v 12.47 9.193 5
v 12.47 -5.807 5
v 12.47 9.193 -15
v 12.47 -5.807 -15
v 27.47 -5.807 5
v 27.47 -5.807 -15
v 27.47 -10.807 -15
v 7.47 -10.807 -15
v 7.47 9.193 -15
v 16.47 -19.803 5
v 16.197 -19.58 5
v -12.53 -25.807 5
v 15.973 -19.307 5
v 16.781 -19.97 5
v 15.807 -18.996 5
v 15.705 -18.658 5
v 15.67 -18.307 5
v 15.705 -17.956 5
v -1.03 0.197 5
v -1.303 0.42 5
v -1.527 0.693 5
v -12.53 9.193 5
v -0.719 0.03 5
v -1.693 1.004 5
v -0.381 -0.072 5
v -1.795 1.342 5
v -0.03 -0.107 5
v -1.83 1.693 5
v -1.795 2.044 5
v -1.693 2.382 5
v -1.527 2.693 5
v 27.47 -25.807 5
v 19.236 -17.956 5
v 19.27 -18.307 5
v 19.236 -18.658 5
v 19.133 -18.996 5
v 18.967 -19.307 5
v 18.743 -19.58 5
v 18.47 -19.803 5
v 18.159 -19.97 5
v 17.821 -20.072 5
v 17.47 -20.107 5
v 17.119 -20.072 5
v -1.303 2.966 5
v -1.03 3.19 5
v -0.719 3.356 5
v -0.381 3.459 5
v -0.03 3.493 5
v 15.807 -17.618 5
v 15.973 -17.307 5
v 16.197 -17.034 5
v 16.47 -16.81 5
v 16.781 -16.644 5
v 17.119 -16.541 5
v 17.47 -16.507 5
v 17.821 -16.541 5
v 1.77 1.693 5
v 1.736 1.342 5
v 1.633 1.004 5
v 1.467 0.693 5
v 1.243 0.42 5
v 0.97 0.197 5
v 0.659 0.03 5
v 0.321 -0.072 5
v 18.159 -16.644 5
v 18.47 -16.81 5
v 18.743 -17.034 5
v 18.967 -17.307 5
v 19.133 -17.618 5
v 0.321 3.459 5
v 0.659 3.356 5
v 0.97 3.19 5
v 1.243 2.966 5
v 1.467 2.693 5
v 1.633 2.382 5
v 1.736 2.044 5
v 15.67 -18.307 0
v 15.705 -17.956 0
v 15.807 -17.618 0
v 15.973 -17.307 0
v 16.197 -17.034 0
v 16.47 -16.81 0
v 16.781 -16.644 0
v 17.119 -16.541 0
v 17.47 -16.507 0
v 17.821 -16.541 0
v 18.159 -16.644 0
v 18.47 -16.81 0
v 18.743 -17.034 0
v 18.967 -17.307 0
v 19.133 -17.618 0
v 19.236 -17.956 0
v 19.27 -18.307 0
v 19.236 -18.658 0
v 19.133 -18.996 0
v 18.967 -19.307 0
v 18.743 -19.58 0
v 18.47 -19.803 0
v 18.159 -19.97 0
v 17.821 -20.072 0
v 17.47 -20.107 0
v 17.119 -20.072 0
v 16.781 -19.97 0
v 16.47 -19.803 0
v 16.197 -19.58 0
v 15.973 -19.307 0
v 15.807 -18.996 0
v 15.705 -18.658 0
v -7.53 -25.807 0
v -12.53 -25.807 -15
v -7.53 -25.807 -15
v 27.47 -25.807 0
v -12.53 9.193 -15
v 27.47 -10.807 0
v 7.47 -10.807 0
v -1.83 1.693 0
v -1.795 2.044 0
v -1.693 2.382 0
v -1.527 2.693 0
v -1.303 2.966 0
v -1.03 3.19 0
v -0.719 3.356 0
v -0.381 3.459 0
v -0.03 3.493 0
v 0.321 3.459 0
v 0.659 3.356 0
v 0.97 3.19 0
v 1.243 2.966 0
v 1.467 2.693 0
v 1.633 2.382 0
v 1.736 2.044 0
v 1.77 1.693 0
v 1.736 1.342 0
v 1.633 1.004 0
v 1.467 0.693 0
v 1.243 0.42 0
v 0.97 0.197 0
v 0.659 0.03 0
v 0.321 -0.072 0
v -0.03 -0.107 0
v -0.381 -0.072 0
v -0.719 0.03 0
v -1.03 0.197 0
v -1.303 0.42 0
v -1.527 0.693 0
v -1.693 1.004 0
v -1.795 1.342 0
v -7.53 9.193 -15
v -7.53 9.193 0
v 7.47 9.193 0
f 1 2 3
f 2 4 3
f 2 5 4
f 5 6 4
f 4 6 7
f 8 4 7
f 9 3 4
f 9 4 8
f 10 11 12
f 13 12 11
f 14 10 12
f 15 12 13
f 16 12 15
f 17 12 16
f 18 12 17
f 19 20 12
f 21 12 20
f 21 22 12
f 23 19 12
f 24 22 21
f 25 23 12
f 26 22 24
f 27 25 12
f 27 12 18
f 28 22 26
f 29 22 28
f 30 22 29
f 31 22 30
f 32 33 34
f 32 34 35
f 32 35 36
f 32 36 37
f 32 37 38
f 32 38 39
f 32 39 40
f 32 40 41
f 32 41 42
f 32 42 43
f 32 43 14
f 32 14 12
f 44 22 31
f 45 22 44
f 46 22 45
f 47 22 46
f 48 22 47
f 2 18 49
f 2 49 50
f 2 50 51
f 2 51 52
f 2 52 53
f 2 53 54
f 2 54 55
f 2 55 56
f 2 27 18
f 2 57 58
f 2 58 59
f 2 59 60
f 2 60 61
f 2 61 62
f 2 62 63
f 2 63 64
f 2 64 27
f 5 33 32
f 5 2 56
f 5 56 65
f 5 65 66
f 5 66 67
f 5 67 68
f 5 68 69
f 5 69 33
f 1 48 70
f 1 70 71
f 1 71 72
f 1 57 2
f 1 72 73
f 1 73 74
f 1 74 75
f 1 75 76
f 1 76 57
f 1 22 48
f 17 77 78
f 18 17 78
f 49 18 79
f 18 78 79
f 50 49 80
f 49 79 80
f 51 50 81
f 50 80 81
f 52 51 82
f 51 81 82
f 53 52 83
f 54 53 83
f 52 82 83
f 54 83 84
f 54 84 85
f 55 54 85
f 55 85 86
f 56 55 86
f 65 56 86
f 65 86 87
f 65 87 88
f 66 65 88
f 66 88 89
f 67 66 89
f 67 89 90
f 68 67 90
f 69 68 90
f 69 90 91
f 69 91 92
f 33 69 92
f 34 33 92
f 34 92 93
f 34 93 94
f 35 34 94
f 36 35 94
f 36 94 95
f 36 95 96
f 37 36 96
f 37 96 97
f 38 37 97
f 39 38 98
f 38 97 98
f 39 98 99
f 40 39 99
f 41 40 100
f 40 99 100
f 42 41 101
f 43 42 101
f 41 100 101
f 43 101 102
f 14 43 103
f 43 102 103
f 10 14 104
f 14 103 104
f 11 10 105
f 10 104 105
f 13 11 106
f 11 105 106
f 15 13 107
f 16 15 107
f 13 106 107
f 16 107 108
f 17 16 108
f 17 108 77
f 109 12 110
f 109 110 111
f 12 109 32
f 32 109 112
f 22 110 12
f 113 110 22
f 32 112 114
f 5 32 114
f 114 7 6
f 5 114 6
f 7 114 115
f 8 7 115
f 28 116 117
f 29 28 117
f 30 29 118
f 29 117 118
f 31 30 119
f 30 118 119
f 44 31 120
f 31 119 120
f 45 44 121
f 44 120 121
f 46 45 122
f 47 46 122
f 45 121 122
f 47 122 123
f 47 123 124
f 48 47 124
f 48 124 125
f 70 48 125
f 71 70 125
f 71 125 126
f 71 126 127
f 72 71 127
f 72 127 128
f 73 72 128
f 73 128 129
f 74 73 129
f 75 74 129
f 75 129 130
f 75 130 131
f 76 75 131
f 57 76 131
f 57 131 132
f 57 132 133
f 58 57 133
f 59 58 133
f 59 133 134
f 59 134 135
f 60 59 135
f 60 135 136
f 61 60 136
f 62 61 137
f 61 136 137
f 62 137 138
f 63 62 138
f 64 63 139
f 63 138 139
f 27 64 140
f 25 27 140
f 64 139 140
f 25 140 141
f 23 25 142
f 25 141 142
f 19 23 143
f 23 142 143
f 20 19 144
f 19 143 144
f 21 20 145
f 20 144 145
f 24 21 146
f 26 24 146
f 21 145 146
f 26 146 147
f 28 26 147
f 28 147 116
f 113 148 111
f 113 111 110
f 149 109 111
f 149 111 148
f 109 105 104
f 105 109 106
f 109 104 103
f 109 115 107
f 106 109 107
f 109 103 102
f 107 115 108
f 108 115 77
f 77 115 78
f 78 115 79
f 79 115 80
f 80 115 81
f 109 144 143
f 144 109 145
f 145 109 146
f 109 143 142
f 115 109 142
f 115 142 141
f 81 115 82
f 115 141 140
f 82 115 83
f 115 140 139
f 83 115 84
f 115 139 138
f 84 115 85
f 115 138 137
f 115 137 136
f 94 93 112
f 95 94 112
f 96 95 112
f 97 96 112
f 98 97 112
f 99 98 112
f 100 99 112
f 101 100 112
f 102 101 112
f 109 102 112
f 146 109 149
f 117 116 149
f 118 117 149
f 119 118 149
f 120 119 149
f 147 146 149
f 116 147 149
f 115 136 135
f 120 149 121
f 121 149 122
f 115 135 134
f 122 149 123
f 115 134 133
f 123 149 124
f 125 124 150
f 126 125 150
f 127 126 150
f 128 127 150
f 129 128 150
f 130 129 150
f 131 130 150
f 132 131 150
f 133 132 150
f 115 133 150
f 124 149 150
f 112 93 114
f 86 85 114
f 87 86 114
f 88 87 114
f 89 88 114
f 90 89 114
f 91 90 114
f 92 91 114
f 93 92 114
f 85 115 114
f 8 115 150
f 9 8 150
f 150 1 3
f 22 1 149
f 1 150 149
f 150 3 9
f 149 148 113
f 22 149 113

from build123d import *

# Parameters (mm, degrees)
BOSS_EXTRUDE1_DEPTH = 5
BOSS_EXTRUDE2_DEPTH = 15
SKETCH3_W           = 5
SKETCH3_H           = 35
BOSS_EXTRUDE3_DEPTH = 15
SKETCH4_W           = 5
SKETCH4_H           = 35
BOSS_EXTRUDE4_DEPTH = 5
BOSS_EXTRUDE5_DEPTH = 5
SKETCH7_R           = 1.8
CUT_EXTRUDE1_DEPTH  = 6


with BuildPart() as part:
    # Sketch1 → Boss-Extrude1 (new body)
    with BuildSketch(Plane.XY):
        Polygon((-7.529880478, -25.806772908), (27.470119522, -25.806772908), (27.470119522, -10.806772908), (7.470119522, -10.806772908), (7.470119522, 9.193227092), (-7.529880478, 9.193227092), align=None)
    extrude(amount=BOSS_EXTRUDE1_DEPTH)



with BuildPart() as body_2:
    # Sketch2 → Boss-Extrude2 (new body)
    with BuildSketch(Plane(origin=(0, 0, 0), x_dir=(-1, 0, 0), z_dir=(0, 0, -1))):
        Polygon((-7.470119522, 9.193227092), (-12.470119522, 9.193227092), (-12.470119522, -5.806772908), (-27.470119522, -5.806772908), (-27.470119522, -10.806772908), (-7.470119522, -10.806772908), align=None)
    extrude(amount=BOSS_EXTRUDE2_DEPTH)


with BuildPart() as body_3:
    # Sketch3 → Boss-Extrude3 (new body)
    with BuildSketch(Plane(origin=(0, 0, 0), x_dir=(-1, 0, 0), z_dir=(0, 0, -1))):
        with Locations((10.029880478, -8.306772908)):
            Rectangle(SKETCH3_W, SKETCH3_H)
    extrude(amount=BOSS_EXTRUDE3_DEPTH)


with BuildPart() as part_1:
    add(part.part)

    add(body_3.part)  # Boss-Extrude4 merges body 3
    # Sketch4 → Boss-Extrude4 (add)
    with BuildSketch(Plane.XY):
        with Locations((-10.029880478, -8.306772908)):
            Rectangle(SKETCH4_W, SKETCH4_H)
    extrude(amount=BOSS_EXTRUDE4_DEPTH)


    add(body_2.part)  # Boss-Extrude5 merges body 2
    # Sketch5 → Boss-Extrude5 (add)
    with BuildSketch(Plane.XY):
        Polygon((7.470119522, 9.193227092), (7.470119522, -10.806772908), (27.470119522, -10.806772908), (27.470119522, -5.806772908), (12.470119522, -5.806772908), (12.470119522, 9.193227092), align=None)
    extrude(amount=BOSS_EXTRUDE5_DEPTH)

    # Sketch7 → Cut-Extrude1 (cut, through all)
    with BuildSketch(Plane(origin=(0, 0, 0), x_dir=(-1, 0, 0), z_dir=(0, 0, -1))):
        with Locations((0.029880478, 1.693227092)):
            Circle(SKETCH7_R)
        with Locations((-17.470119522, -18.306772908)):
            Circle(SKETCH7_R)
    extrude(amount=-CUT_EXTRUDE1_DEPTH, mode=Mode.SUBTRACT)


solid = part_1.part
